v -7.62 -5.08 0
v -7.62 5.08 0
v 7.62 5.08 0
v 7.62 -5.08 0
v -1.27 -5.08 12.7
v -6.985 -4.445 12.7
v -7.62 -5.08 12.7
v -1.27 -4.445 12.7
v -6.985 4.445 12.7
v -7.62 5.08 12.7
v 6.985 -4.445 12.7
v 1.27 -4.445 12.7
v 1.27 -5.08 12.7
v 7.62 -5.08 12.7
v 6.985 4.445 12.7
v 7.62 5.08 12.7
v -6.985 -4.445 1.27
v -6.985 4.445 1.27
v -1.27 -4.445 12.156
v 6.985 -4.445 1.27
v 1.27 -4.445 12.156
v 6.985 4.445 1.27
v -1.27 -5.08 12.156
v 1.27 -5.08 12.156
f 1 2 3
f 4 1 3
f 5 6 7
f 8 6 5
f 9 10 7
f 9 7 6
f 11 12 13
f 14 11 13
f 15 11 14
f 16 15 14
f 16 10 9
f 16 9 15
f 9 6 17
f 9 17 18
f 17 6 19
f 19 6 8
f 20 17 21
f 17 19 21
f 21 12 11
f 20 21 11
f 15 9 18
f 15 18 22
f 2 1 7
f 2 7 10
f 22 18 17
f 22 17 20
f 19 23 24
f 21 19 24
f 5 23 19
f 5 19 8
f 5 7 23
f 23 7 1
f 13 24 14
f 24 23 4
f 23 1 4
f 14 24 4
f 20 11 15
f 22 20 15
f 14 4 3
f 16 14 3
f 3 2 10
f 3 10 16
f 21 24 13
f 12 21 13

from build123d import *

# Parameters (mm, degrees)
F0_W     = 15.24
F0_H     = 10.16
F1_DEPTH = 12.7
F2_W     = 13.97
F2_H     = 8.89
F3_DEPTH = 11.43
F4_W     = 2.54
F4_H     = 0.5442967311
F5_DEPTH = 2.54


with BuildPart() as f1:
    # F0 (on Top) → F1 (new body)
    with BuildSketch(Plane.XY):
        Rectangle(F0_W, F0_H)
    extrude(amount=F1_DEPTH)

    # F2 (on face) → F3 (cut)
    with BuildSketch(Plane.XY.offset(12.7)):
        Rectangle(F2_W, F2_H)
    extrude(amount=-F3_DEPTH, mode=Mode.SUBTRACT)

    # F4 (on face) → F5 (cut)
    with BuildSketch(Plane.XZ.offset(5.08)):
        with Locations((0, 12.4278516345)):
            Rectangle(F4_W, F4_H)
    extrude(amount=-F5_DEPTH, mode=Mode.SUBTRACT)


solid = f1.part
